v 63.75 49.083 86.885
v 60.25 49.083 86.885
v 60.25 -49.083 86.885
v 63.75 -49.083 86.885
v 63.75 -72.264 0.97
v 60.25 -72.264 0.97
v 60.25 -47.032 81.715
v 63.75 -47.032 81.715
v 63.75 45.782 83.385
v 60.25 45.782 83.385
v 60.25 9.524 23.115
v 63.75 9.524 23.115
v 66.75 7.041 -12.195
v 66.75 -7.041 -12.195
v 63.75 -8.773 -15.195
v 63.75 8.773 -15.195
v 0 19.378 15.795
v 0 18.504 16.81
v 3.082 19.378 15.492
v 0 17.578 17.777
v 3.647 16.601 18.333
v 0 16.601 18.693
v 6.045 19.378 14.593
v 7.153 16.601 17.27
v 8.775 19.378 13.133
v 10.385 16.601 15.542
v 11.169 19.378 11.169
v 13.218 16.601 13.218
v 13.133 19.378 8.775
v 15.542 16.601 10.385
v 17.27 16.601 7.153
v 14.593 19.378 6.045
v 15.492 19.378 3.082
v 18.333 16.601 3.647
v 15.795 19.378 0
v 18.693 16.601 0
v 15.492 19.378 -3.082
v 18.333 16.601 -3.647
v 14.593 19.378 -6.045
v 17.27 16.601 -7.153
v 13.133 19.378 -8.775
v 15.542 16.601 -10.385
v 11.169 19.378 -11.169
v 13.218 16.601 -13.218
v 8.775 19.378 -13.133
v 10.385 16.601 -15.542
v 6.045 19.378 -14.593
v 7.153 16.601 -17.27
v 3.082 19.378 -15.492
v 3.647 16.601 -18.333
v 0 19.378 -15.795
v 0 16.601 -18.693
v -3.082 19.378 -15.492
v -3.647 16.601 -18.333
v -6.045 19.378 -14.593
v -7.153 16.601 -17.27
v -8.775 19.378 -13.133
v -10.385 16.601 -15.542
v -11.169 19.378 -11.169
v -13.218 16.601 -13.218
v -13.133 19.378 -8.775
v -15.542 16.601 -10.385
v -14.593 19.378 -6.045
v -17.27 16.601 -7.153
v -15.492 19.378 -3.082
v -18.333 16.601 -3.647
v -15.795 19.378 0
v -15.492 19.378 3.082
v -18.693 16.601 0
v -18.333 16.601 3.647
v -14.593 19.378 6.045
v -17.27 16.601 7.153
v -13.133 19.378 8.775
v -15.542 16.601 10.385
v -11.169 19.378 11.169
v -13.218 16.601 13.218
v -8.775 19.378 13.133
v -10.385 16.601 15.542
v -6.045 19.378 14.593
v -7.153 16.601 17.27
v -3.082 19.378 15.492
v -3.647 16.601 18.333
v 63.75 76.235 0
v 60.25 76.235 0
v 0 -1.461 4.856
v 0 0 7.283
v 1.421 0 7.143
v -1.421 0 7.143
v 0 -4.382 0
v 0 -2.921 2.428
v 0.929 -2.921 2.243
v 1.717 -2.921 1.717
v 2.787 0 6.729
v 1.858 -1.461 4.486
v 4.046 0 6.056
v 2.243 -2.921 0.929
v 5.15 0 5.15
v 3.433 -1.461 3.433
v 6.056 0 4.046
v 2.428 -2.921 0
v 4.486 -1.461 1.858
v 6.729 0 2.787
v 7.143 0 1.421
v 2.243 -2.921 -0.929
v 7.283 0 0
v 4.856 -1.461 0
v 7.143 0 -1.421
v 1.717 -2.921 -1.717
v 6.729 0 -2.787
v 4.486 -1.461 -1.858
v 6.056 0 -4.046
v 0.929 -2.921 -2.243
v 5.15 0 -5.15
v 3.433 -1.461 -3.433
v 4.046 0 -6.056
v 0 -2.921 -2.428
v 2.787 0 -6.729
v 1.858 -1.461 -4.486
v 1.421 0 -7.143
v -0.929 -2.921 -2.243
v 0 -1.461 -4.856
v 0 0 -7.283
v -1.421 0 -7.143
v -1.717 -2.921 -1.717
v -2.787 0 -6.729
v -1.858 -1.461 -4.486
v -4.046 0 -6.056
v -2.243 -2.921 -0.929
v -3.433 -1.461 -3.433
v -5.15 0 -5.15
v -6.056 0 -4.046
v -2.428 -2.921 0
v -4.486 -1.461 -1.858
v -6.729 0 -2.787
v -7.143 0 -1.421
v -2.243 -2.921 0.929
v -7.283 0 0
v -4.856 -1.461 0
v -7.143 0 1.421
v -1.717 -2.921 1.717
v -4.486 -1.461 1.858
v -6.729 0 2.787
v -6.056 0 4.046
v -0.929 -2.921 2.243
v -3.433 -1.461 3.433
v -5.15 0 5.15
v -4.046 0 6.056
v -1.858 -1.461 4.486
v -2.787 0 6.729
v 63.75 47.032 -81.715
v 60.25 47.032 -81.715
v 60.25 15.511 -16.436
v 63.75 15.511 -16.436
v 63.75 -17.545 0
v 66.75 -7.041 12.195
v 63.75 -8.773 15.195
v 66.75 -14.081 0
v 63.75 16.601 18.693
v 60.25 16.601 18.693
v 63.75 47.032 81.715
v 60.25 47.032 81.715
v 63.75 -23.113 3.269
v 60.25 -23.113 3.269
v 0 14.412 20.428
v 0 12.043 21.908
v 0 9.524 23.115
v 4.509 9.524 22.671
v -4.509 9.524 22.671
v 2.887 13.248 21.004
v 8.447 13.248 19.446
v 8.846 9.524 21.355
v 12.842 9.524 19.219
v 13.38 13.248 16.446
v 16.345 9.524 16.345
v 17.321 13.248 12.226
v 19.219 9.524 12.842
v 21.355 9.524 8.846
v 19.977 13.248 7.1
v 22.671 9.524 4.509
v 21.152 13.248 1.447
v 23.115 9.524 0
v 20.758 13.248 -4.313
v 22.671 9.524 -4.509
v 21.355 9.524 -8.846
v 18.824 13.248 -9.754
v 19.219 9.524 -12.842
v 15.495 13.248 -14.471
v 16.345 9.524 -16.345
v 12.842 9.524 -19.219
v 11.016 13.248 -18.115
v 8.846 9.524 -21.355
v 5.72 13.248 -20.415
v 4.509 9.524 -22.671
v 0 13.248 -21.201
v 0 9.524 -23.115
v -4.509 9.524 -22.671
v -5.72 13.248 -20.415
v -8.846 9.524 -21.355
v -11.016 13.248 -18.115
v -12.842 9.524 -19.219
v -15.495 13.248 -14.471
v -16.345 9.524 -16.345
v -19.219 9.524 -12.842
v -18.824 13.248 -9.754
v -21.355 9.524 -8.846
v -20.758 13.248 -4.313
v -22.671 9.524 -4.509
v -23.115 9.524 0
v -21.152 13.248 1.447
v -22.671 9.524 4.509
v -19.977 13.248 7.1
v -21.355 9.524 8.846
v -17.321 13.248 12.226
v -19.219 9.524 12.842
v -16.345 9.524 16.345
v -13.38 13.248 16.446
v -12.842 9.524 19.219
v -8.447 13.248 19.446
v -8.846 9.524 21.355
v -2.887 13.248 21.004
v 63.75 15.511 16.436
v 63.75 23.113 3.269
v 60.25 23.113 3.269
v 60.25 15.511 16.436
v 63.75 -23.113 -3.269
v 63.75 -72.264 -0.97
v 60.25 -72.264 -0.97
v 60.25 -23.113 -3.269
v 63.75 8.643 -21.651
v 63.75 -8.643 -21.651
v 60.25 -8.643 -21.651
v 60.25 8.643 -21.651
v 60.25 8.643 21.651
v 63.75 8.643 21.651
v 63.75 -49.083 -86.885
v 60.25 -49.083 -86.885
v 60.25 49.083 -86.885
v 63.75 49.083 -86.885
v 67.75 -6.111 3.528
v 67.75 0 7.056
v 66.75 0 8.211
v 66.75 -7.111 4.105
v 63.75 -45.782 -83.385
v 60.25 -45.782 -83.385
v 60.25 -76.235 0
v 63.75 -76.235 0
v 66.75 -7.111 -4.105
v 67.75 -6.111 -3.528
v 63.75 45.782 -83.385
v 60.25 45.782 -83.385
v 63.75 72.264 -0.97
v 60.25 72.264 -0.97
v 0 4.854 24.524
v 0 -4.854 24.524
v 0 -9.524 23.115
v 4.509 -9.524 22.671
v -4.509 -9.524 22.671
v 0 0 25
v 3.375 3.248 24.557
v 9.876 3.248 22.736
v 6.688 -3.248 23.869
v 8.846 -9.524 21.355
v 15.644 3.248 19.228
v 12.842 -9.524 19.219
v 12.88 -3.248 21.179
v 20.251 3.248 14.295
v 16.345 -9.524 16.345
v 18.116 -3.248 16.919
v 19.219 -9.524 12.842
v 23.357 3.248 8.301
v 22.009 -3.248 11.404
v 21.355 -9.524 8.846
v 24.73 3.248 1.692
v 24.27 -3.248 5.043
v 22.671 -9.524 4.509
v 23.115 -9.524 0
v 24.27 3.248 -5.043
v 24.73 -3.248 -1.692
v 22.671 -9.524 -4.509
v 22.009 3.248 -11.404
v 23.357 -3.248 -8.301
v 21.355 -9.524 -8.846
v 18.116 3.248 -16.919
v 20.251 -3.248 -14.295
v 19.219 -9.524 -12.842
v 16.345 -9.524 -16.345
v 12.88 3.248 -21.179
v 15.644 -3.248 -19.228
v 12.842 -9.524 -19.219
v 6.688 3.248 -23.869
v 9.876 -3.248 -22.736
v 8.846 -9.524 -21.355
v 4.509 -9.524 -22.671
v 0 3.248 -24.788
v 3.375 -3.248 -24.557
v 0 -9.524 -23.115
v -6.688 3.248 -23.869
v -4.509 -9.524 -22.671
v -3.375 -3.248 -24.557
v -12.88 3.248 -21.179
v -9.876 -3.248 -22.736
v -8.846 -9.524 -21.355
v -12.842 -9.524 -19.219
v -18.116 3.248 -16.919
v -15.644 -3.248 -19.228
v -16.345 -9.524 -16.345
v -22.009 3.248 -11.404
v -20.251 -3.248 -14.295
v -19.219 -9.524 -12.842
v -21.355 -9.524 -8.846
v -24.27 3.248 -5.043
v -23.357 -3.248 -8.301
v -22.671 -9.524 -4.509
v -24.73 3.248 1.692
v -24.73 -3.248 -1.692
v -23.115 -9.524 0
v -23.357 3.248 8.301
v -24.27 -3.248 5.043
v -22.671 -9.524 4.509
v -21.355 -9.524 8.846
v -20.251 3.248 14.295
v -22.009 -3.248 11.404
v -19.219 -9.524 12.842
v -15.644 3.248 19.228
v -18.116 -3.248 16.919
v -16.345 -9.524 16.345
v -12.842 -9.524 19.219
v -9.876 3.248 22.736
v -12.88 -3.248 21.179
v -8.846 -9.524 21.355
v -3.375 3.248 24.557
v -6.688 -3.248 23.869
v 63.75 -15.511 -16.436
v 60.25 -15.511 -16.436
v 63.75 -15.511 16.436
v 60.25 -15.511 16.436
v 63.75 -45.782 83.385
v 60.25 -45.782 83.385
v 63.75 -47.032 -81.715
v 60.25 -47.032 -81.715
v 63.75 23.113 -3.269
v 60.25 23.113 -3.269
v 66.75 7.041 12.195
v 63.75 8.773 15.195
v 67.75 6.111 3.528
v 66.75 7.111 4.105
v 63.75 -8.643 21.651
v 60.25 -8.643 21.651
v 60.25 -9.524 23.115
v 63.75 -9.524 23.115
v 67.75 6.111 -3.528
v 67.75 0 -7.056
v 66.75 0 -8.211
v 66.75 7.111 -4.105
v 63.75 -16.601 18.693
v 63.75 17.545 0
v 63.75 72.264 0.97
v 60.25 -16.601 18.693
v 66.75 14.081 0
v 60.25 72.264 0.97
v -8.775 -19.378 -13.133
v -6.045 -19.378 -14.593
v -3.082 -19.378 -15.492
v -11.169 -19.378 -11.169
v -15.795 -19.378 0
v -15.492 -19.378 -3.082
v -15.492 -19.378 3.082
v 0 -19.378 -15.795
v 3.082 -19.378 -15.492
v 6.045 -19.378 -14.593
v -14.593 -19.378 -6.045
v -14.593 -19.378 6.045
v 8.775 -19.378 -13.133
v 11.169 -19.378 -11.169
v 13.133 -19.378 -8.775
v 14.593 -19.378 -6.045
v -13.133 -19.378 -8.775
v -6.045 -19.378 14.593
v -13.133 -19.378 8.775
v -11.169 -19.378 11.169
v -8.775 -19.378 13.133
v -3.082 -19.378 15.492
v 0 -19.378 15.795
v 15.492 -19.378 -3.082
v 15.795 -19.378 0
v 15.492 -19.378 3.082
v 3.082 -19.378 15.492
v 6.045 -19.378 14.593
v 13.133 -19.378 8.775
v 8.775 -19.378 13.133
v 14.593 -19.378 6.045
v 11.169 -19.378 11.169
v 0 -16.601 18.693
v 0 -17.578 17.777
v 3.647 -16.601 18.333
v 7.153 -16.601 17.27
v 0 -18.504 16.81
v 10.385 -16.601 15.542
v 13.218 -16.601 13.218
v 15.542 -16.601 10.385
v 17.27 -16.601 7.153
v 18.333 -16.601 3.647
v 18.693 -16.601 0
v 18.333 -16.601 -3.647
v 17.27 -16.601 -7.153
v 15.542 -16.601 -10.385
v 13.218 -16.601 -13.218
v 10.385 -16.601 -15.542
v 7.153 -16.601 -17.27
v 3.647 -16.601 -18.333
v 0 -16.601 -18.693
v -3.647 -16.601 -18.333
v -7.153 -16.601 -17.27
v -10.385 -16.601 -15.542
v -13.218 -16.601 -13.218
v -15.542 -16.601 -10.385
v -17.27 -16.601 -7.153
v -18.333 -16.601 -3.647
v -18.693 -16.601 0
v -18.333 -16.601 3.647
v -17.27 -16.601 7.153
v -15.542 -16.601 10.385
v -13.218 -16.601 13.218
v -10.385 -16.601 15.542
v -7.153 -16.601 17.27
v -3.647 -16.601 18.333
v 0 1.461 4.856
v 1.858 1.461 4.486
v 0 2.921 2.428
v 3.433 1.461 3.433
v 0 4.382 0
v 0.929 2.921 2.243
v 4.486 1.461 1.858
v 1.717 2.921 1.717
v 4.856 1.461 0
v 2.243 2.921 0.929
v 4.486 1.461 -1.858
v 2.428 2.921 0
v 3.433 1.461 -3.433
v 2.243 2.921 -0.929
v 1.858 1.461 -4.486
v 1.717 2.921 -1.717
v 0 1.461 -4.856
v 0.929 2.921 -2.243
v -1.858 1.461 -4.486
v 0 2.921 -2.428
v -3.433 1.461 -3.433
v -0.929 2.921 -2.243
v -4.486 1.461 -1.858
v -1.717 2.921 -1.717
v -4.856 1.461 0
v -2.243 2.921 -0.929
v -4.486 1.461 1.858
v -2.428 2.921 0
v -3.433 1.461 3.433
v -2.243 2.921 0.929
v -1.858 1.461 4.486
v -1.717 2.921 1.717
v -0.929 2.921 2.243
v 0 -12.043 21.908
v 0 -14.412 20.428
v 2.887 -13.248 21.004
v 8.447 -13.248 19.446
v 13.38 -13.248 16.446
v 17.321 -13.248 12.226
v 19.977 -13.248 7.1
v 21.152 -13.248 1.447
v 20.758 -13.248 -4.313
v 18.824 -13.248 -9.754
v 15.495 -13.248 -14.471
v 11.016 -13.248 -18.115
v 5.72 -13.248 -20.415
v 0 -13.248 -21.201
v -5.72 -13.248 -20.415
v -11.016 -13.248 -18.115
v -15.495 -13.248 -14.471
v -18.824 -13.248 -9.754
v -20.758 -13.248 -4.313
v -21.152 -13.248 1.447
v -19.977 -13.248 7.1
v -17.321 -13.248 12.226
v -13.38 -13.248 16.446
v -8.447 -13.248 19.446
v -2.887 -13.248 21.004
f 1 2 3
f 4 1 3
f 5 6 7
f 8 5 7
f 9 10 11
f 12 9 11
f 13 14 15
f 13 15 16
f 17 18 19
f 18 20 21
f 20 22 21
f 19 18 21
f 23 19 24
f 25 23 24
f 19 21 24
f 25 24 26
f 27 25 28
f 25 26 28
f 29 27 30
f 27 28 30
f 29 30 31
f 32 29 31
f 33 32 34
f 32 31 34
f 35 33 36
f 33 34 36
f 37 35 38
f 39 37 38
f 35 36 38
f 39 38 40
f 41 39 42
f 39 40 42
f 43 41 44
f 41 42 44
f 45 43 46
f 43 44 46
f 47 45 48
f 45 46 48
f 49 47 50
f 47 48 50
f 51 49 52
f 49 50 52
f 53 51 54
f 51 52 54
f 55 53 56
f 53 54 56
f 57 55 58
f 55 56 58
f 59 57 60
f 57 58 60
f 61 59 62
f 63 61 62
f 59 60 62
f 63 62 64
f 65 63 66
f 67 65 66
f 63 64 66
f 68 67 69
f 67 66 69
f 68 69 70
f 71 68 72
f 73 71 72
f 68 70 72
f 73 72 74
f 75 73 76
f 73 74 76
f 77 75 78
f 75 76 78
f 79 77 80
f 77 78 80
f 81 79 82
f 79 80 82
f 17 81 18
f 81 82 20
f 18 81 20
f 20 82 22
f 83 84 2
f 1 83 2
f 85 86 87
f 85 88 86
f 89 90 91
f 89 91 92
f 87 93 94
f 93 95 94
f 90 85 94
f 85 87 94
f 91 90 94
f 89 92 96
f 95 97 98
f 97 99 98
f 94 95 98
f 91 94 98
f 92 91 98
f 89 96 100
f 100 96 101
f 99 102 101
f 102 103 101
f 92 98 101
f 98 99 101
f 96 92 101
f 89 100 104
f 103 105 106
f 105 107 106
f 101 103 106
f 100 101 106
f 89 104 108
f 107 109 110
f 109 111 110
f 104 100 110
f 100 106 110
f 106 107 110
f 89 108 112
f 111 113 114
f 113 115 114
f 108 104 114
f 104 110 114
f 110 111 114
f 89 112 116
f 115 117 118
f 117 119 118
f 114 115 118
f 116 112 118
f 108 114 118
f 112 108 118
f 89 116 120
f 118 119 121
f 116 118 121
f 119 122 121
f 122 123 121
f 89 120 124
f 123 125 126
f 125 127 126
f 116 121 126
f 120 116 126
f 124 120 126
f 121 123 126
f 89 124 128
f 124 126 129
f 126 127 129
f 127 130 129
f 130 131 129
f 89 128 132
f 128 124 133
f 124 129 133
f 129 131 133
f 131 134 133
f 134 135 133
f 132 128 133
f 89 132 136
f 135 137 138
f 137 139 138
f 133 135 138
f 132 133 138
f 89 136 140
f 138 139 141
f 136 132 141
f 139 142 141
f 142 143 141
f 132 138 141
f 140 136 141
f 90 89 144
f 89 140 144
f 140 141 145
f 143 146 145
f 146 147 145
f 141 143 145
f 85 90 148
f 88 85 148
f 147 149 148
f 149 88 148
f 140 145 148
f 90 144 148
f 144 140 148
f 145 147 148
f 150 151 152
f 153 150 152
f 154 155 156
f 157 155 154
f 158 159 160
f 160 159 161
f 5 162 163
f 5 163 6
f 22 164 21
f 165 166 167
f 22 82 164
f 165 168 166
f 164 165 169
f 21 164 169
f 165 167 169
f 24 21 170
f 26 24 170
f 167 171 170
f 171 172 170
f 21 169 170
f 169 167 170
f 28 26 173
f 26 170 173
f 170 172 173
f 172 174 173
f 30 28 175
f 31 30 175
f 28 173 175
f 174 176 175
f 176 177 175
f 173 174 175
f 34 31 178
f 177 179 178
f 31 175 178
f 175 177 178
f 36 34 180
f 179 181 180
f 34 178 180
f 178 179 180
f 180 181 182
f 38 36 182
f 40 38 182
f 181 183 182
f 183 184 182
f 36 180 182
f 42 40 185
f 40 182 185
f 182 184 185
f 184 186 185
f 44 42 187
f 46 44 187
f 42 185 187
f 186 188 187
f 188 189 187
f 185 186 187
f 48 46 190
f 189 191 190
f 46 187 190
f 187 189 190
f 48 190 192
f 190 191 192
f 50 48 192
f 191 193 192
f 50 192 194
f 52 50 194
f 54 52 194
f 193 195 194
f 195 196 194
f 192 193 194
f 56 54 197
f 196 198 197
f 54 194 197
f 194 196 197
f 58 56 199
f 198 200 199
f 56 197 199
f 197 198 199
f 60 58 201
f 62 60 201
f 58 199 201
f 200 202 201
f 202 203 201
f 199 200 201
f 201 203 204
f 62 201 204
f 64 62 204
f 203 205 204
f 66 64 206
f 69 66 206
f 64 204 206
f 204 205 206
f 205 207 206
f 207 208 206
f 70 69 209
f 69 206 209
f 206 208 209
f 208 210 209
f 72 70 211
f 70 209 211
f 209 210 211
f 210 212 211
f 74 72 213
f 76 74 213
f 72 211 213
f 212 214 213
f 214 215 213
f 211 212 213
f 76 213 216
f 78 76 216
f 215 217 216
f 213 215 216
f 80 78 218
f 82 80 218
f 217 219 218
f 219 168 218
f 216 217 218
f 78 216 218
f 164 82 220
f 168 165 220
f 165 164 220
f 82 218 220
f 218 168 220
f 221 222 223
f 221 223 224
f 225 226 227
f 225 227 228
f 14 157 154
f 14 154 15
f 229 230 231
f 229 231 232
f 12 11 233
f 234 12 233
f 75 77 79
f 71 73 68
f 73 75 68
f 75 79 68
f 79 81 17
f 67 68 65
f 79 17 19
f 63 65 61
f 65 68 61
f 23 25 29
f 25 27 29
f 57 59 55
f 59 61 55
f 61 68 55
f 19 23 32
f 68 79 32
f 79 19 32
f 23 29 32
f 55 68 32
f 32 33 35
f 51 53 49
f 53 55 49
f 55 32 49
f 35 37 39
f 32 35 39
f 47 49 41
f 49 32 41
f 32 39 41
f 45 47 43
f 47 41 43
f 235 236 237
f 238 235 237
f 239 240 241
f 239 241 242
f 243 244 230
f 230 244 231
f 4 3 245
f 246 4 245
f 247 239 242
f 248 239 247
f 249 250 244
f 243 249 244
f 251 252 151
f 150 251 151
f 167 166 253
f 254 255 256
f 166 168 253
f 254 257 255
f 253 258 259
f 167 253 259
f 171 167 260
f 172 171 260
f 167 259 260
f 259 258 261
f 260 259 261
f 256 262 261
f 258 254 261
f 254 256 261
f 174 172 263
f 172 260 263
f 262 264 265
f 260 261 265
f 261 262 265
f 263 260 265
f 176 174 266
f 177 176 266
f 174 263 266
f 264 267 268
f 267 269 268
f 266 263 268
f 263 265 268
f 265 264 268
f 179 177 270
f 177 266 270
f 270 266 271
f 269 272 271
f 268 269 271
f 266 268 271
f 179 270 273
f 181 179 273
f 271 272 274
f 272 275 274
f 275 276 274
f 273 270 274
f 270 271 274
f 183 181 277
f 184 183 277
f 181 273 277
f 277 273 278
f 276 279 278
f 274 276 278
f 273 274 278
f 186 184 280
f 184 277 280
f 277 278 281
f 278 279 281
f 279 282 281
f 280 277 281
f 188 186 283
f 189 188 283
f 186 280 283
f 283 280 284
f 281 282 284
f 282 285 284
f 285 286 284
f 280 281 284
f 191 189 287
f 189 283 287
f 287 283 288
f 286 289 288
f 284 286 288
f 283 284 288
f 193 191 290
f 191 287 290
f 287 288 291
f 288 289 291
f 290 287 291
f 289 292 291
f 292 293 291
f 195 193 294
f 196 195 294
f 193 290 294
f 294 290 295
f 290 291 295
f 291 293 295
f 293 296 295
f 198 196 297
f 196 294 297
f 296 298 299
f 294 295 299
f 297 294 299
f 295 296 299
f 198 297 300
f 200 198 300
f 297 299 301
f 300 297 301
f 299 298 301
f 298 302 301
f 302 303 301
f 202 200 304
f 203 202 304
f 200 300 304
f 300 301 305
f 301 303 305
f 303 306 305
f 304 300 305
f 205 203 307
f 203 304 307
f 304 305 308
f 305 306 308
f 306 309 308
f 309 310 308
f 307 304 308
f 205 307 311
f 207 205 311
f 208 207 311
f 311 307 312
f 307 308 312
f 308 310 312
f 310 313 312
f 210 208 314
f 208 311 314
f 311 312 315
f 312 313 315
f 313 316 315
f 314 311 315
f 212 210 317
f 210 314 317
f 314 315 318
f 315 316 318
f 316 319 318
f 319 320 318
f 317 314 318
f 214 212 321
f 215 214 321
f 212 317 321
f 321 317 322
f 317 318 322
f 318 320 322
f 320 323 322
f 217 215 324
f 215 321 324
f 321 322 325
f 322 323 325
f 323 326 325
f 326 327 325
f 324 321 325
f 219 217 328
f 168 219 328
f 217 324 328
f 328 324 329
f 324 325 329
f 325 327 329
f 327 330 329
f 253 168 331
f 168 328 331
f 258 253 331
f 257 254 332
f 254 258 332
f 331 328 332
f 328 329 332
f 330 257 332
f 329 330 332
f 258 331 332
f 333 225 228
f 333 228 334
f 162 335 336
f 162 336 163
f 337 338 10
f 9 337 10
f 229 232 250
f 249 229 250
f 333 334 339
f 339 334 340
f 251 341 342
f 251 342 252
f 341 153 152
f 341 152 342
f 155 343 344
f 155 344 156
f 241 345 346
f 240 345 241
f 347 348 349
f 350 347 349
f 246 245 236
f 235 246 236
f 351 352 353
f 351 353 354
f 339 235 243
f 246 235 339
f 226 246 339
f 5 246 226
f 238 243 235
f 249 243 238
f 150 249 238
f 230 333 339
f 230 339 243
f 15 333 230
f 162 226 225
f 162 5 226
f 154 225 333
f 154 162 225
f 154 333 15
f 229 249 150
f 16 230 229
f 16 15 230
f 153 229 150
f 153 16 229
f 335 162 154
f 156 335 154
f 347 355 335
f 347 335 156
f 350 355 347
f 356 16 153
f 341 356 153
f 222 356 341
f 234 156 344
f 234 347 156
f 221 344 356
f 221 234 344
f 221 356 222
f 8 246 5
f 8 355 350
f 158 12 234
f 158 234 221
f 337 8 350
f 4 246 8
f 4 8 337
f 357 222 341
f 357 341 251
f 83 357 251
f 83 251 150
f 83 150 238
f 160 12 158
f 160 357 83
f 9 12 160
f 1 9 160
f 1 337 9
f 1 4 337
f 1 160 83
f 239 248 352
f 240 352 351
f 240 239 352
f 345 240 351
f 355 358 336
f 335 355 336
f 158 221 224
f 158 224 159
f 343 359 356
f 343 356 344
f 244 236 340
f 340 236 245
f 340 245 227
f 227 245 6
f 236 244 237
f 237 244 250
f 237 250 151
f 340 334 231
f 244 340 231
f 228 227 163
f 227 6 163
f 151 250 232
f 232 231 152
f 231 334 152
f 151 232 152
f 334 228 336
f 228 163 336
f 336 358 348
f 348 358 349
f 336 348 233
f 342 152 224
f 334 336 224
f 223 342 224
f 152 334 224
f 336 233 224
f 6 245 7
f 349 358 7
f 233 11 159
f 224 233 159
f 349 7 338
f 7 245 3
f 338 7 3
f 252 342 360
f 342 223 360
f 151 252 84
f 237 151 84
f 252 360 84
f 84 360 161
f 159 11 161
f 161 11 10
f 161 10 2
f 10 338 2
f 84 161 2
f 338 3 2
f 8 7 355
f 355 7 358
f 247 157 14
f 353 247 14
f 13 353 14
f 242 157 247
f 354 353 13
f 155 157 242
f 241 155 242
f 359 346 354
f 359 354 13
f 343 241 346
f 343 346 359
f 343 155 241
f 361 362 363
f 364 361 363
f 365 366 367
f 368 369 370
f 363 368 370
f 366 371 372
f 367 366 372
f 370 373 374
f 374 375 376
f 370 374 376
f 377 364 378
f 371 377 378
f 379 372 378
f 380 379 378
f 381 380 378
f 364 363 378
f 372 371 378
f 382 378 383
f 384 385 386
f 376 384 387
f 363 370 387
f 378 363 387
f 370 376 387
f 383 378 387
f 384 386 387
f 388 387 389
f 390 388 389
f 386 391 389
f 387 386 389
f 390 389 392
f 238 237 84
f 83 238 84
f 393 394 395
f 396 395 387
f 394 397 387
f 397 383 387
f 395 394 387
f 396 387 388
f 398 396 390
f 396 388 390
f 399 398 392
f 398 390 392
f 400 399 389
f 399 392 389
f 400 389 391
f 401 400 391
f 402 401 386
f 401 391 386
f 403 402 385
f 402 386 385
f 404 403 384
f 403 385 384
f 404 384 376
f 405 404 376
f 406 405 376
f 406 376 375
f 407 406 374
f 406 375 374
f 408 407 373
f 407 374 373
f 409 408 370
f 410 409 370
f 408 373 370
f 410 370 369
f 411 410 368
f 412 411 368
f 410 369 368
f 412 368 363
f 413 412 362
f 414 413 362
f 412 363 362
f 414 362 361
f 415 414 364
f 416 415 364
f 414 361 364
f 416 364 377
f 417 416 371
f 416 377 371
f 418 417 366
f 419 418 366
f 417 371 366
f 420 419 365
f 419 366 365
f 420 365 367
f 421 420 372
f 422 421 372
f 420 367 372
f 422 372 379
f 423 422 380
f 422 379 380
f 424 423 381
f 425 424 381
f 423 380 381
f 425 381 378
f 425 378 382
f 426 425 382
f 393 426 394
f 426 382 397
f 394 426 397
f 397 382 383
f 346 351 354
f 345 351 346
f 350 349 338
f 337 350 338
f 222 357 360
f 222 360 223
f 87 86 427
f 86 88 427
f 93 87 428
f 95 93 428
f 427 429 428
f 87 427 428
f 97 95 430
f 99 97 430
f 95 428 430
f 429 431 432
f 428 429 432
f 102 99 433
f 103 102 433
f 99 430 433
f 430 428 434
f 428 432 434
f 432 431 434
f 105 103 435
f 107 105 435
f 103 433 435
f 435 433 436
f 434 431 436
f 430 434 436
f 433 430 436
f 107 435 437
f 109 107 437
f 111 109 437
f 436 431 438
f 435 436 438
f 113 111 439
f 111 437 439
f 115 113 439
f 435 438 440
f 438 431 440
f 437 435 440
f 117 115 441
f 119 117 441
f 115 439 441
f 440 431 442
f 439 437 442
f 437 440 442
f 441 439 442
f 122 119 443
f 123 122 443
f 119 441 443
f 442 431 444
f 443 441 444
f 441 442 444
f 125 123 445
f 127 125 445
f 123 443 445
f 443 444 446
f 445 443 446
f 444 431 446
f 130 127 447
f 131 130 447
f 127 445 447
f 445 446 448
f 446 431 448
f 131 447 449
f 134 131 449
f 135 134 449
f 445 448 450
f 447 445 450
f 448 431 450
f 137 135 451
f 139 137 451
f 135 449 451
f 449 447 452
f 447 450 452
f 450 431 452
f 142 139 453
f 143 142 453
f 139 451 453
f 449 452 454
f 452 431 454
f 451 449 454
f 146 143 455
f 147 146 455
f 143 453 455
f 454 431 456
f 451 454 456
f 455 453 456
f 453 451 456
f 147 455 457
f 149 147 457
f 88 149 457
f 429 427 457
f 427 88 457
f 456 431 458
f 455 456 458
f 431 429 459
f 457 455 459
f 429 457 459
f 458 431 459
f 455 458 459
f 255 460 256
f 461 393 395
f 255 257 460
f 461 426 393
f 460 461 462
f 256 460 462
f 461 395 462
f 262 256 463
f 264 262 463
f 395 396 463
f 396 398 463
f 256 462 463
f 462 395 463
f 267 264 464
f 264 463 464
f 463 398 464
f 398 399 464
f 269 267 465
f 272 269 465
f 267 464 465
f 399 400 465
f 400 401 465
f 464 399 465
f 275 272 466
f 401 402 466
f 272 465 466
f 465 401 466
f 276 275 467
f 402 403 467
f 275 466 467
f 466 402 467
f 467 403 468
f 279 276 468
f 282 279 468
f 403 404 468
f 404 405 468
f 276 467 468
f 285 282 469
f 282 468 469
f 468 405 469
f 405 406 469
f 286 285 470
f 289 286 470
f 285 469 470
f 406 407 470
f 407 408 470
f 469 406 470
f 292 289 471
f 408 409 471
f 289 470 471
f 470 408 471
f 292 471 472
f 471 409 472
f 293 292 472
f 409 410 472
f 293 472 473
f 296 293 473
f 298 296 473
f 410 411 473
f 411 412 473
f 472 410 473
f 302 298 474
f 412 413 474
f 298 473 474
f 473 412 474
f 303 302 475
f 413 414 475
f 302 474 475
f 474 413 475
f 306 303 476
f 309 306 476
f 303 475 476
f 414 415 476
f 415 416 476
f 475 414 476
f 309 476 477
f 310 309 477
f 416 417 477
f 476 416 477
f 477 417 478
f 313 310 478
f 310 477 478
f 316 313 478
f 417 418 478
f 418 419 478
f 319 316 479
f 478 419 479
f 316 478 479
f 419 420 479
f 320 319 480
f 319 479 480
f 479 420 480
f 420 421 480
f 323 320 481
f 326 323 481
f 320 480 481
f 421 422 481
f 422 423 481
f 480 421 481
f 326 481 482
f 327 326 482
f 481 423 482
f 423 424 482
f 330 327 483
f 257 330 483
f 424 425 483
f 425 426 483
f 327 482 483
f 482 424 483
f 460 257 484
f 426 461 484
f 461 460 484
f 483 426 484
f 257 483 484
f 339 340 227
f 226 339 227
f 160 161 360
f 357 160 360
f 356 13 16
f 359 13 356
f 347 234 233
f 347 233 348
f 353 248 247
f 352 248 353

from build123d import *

# Parameters (mm, degrees)
F2_START = 60.25
F2_DEPTH = 3.5
F4_DEPTH = 3.5
F6_DEPTH = 3
F7_SIZE  = 2.99999
F9_DEPTH = 1
F10_SIZE = 0.99999


# Not quite as in the source:
# - a fillet or chamfer is up to 0.001 mm smaller than in the source, because OpenCascade refuses the exact size
# - a feature names something its author has since deleted; it is built from what else it names


with BuildPart() as f1:
    # F0 (on Right) → F1 (revolve)
    with BuildSketch(Plane.YZ):
        with BuildLine():
            ThreePointArc((-16.6007267077, 18.6926689581), (-18.0475959302, 17.2998347143), (-19.3779955618, 15.795356533))
            Line((-19.3779955618, 15.795356533), (-19.3779955618, 0))
            Line((-19.3779955618, 0), (-7.5747272931, 0))
            Line((-7.5747272931, 0), (-16.6007267077, 18.6926689581))
        make_face()
        with BuildLine():
            ThreePointArc((-9.5239152868, 23.1148228981), (-13.2481353859, 21.2011063107), (-16.6007267077, 18.6926689581))
            Line((-16.6007267077, 18.6926689581), (-7.5747272931, 0))
            Line((-7.5747272931, 0), (-4.3816049583, 0))
            Line((-4.3816049583, 0), (0, 7.2834400177))
            Line((0, 7.2834400177), (-9.5239152868, 23.1148228981))
        make_face()
        with BuildLine():
            ThreePointArc((9.5239152868, 23.1148228981), (0, 25), (-9.5239152868, 23.1148228981))
            Line((-9.5239152868, 23.1148228981), (0, 7.2834400177))
            Line((0, 7.2834400177), (9.5239152868, 23.1148228981))
        make_face()
        with BuildLine():
            ThreePointArc((16.6007267077, 18.6926689581), (13.2481353859, 21.2011063107), (9.5239152868, 23.1148228981))
            Line((9.5239152868, 23.1148228981), (0, 7.2834400177))
            Line((0, 7.2834400177), (4.3816049583, 0))
            Line((4.3816049583, 0), (7.5747272931, 0))
            Line((7.5747272931, 0), (16.6007267077, 18.6926689581))
        make_face()
        with BuildLine():
            ThreePointArc((19.3779955618, 15.795356533), (18.0475959302, 17.2998347143), (16.6007267077, 18.6926689581))
            Line((16.6007267077, 18.6926689581), (7.5747272931, 0))
            Line((7.5747272931, 0), (19.3779955618, 0))
            Line((19.3779955618, 0), (19.3779955618, 15.795356533))
        make_face()
    revolve(axis=Axis((0, 9.6889977809, 0), (0, 1, 0)))


with BuildPart() as f2:
    # F0 (on Right) → F2 (new body)
    with BuildSketch(Plane.YZ.offset(F2_START)):
        Polygon((49.0827742896, 86.8854269893), (0, 86.8854269893), (-49.0827742896, 86.8854269893), (-76.2346684933, 0), (-49.0827742896, -86.8854269893), (0, -86.8854269893), (49.0827742896, -86.8854269893), (76.2346684933, 0), align=None)
        Polygon((-45.7817793022, -83.3854269893), (0, -7.2834400177), (45.7817793022, -83.3854269893), (0, -83.3854269893), align=None, mode=Mode.SUBTRACT)
        with BuildLine():
            Line((-47.0317255702, 81.7146747964), (-16.6007267077, 18.6926689581))
            ThreePointArc((-16.6007267077, 18.6926689581), (-13.2481353859, 21.2011063107), (-9.5239152868, 23.1148228981))
            Line((-9.5239152868, 23.1148228981), (-45.7817793022, 83.3854269893))
            Line((-45.7817793022, 83.3854269893), (0, 83.3854269893))
            Line((0, 83.3854269893), (45.7817793022, 83.3854269893))
            Line((45.7817793022, 83.3854269893), (9.5239152868, 23.1148228981))
            ThreePointArc((9.5239152868, 23.1148228981), (13.2481353859, 21.2011063107), (16.6007267077, 18.6926689581))
            Line((16.6007267077, 18.6926689581), (47.0317255702, 81.7146747964))
            Line((47.0317255702, 81.7146747964), (72.5677479141, 0))
            Line((72.5677479141, 0), (47.0317255702, -81.7146747964))
            Line((47.0317255702, -81.7146747964), (7.5747272931, 0))
            Line((7.5747272931, 0), (4.3816049583, 0))
            Line((4.3816049583, 0), (0, -7.2834400177))
            Line((0, -7.2834400177), (-4.3816049583, 0))
            Line((-4.3816049583, 0), (-7.5747272931, 0))
            Line((-7.5747272931, 0), (-47.0317255702, -81.7146747964))
            Line((-47.0317255702, -81.7146747964), (-72.5677479141, 0))
            Line((-72.5677479141, 0), (-47.0317255702, 81.7146747964))
        make_face(mode=Mode.SUBTRACT)
        with BuildLine():
            ThreePointArc((-9.5239152868, 23.1148228981), (-13.2481353859, 21.2011063107), (-16.6007267077, 18.6926689581))
            Line((-16.6007267077, 18.6926689581), (-7.5747272931, 0))
            Line((-7.5747272931, 0), (-4.3816049583, 0))
            Line((-4.3816049583, 0), (0, 7.2834400177))
            Line((0, 7.2834400177), (-9.5239152868, 23.1148228981))
        make_face()
        with BuildLine():
            ThreePointArc((16.6007267077, 18.6926689581), (13.2481353859, 21.2011063107), (9.5239152868, 23.1148228981))
            Line((9.5239152868, 23.1148228981), (0, 7.2834400177))
            Line((0, 7.2834400177), (4.3816049583, 0))
            Line((4.3816049583, 0), (7.5747272931, 0))
            Line((7.5747272931, 0), (16.6007267077, 18.6926689581))
        make_face()
        Polygon((0, 7.2834400177), (-4.3816049583, 0), (0, 0), (4.3816049583, 0), align=None)
        Polygon((0, 0), (-4.3816049583, 0), (0, -7.2834400177), (4.3816049583, 0), align=None)
    extrude(amount=F2_DEPTH)

    # F3 (on face) → F4 (join, through all)
    with BuildSketch(Plane.YZ.offset(63.75)):
        Polygon((23.1128721452, -3.2686013249), (25, 0), (23.1128721452, 3.2686013249), (0, 4.3492764235), (-23.1128721452, 3.2686013249), (-25, 0), (-23.1128721452, -3.2686013249), (0, -4.3492764235), align=None)
        Polygon((12.5, -21.6506350946), (23.1128721452, -3.2686013249), (0, -4.3492764235), (-23.1128721452, -3.2686013249), (-12.5, -21.6506350946), align=None)
        Polygon((0, 4.3492764235), (23.1128721452, 3.2686013249), (12.5, 21.6506350946), (-12.5, 21.6506350946), (-23.1128721452, 3.2686013249), align=None)
        Polygon((-72.2644806371, -0.9704481998), (-23.1128721452, -3.2686013249), (-25, 0), (-23.1128721452, 3.2686013249), (-72.2644806371, 0.9704481998), (-72.5677479141, 0), align=None)
        Polygon((23.1128721452, 3.2686013249), (25, 0), (23.1128721452, -3.2686013249), (72.2644806371, -0.9704481998), (72.5677479141, 0), (72.2644806371, 0.9704481998), align=None)
    extrude(amount=-F4_DEPTH)

    # F5 (on face) → F6 (join)
    with BuildSketch(Plane.YZ.offset(63.75)):
        Polygon((8.7727464607, 15.1948425919), (-8.7727464607, 15.1948425919), (-17.5454929214, 0), (-8.7727464607, -15.1948425919), (8.7727464607, -15.1948425919), (17.5454929214, 0), align=None)
    extrude(amount=F6_DEPTH)

    # F7 (size 3 in the source; OpenCascade refuses exactly that, so slightly less here)
    f7_edges = [f2.edges().sort_by_distance(p)[0] for p in [
        (66.75, -13.15912, 7.597421),
        (66.75, 0, 15.194843),
        (66.75, 13.15912, 7.597421),
        (66.75, 13.15912, -7.597421),
        (66.75, 0, -15.194843),
        (66.75, -13.15912, -7.597421),
    ]]
    chamfer(f7_edges, length=F7_SIZE)

    # F8 (on face) → F9 (join)
    with BuildSketch(Plane.YZ.offset(66.75)):
        Polygon((7.1106306277, -4.105324507), (7.1106306277, 4.105324507), (0, 8.210649014), (-7.1106306277, 4.105324507), (-7.1106306277, -4.105324507), (0, -8.210649014), align=None)
    extrude(amount=F9_DEPTH)

    # F10 (size 1 in the source; OpenCascade refuses exactly that, so slightly less here)
    f10_edges = [f2.edges().sort_by_distance(p)[0] for p in [
        (67.75, -3.555315, 6.157987),
        (67.75, 3.555315, 6.157987),
        (67.75, 7.110631, 0),
        (67.75, 3.555315, -6.157987),
        (67.75, -3.555315, -6.157987),
        (67.75, -7.110631, 0),
    ]]
    chamfer(f10_edges, length=F10_SIZE)


solid = Compound([f1.part, f2.part])
